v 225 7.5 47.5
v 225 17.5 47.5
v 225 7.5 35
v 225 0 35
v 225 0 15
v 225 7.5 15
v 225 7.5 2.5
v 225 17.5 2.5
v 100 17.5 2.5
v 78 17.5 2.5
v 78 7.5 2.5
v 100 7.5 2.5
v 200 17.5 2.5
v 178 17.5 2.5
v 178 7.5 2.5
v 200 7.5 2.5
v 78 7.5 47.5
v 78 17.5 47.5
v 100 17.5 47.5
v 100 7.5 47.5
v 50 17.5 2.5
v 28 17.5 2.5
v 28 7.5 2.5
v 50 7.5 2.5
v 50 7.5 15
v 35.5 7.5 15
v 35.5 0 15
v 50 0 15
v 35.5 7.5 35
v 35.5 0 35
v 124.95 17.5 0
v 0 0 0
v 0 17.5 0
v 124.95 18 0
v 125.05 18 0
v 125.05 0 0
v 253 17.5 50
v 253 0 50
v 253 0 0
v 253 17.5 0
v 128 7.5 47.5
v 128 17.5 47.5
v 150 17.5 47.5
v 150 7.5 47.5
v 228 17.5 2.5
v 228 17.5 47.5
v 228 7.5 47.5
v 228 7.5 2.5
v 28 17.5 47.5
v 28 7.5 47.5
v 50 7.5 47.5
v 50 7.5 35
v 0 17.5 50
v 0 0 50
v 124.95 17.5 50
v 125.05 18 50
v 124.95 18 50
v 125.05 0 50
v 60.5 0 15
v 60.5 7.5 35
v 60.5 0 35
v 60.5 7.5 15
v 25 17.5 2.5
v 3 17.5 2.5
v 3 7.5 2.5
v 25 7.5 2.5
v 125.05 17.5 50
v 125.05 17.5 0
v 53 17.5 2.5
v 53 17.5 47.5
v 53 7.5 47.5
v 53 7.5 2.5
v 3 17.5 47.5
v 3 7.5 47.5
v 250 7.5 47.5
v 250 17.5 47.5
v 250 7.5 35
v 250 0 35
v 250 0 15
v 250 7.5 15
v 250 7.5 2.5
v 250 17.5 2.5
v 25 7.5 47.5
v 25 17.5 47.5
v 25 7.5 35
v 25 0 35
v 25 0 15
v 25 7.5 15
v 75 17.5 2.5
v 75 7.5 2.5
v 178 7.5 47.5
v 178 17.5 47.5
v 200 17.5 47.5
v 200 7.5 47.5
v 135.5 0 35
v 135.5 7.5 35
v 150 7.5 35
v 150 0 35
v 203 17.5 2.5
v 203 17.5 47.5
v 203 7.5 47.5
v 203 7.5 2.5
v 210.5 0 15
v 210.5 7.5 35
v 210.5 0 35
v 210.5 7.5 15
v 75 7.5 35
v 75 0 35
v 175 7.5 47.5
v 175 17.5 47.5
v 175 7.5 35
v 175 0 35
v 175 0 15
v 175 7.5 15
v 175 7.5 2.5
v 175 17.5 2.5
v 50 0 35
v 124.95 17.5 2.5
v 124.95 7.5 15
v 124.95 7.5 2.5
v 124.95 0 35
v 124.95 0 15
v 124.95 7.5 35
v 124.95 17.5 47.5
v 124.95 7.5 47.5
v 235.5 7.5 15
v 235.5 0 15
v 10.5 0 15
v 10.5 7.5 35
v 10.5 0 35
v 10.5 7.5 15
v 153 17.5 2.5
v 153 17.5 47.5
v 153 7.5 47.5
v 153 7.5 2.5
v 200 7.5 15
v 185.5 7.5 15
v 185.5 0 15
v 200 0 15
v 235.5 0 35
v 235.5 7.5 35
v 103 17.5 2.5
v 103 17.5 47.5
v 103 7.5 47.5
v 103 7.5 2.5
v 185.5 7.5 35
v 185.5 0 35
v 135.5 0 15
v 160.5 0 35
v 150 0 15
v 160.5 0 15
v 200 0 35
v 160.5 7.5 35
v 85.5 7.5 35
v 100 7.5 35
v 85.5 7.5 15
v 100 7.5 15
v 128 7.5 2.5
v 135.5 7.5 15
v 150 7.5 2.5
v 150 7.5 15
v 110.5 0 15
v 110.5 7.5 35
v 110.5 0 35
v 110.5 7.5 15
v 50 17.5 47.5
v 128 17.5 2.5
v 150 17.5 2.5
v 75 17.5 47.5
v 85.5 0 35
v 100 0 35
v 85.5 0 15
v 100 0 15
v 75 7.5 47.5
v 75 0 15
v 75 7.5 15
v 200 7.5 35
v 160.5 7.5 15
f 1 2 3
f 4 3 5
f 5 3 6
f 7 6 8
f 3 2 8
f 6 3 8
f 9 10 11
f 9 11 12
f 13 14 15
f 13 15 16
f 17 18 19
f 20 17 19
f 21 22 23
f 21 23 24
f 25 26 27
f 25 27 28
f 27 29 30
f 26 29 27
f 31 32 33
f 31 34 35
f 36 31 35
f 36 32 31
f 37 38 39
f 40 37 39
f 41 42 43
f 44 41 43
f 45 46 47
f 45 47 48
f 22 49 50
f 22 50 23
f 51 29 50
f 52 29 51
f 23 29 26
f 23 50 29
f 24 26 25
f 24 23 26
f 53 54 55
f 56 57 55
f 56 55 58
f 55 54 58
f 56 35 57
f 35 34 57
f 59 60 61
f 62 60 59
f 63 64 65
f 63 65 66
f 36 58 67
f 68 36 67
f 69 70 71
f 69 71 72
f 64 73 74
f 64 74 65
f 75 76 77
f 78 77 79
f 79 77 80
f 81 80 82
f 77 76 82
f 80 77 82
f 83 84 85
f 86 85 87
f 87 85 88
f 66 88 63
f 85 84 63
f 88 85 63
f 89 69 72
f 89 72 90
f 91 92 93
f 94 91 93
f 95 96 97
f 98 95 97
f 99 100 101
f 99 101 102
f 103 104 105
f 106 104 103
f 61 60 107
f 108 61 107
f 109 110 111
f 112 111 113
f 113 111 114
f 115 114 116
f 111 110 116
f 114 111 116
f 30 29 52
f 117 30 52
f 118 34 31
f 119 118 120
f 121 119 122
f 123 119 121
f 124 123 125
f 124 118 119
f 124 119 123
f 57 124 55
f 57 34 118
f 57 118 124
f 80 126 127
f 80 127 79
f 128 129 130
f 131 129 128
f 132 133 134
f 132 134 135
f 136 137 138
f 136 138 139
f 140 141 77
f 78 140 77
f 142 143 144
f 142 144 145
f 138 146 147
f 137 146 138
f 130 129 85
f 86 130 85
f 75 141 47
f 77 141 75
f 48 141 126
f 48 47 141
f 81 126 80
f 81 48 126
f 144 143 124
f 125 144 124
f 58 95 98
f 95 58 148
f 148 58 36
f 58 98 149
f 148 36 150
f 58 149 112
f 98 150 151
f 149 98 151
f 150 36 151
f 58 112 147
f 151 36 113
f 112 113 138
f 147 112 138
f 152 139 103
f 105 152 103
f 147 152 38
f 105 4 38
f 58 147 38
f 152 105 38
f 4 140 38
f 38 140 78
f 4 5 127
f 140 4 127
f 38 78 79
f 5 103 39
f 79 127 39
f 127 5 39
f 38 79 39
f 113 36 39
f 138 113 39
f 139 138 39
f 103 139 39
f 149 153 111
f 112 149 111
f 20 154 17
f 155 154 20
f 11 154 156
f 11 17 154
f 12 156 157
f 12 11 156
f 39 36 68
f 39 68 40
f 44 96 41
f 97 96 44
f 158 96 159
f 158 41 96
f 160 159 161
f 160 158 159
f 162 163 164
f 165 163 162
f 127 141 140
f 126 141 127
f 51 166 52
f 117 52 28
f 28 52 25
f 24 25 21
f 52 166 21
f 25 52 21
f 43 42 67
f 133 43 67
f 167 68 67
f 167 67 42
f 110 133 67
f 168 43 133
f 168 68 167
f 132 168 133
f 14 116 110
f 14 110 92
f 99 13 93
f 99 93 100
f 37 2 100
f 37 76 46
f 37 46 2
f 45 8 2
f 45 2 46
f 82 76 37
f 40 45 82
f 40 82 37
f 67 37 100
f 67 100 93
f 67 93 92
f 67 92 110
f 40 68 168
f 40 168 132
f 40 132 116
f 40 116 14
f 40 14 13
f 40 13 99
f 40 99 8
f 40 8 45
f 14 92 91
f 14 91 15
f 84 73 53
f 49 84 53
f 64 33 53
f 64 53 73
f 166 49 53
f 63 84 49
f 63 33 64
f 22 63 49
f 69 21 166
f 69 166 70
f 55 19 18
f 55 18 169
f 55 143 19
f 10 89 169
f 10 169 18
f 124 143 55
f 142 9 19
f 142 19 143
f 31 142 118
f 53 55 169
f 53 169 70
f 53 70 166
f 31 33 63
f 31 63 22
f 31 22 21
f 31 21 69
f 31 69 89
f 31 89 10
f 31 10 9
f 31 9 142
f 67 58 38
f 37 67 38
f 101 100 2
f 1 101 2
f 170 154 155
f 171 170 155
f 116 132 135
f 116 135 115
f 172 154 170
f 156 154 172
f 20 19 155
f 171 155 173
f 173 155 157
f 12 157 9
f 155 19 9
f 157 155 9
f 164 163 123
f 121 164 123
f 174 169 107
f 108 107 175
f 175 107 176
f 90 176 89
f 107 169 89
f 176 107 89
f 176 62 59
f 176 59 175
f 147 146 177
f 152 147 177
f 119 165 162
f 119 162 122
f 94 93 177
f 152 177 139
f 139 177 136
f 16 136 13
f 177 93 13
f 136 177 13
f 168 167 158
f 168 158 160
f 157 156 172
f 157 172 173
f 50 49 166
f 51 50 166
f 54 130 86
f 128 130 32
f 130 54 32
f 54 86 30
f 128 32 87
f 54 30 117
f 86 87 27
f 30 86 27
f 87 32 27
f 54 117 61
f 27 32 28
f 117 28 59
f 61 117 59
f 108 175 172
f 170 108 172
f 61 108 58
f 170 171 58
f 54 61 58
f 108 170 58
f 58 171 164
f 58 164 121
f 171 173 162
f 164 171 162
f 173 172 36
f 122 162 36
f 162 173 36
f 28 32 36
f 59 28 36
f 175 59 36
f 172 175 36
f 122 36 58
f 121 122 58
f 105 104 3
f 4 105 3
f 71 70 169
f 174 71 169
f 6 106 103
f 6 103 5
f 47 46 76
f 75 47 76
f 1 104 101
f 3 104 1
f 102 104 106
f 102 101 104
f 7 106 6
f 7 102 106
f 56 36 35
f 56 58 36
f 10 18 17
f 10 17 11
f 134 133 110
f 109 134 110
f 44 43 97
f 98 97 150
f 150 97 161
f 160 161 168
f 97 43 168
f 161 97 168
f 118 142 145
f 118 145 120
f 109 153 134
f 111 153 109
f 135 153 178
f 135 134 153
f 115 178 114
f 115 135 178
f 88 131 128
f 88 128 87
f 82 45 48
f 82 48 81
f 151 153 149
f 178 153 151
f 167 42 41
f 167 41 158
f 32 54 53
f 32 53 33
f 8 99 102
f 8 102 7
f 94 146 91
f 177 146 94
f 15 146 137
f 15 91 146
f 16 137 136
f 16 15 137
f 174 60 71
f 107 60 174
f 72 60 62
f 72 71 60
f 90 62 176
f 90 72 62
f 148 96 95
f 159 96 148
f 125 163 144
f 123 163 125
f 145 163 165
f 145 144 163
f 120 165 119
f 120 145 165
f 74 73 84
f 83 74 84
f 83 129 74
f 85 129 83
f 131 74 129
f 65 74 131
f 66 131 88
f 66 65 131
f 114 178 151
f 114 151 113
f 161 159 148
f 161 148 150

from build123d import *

# Parameters (mm, degrees)
SKETCH1_W           = 253
SKETCH1_H           = 50
BOSS_EXTRUDE1_DEPTH = 17.5
SKETCH2_W           = 22
SKETCH2_H           = 45
CUT_EXTRUDE1_DEPTH  = 10
SKETCH3_W           = 14.5
SKETCH3_H           = 20
CUT_EXTRUDE2_DEPTH  = 17.5
LPATTERN1_COUNT     = 10
LPATTERN1_PITCH     = 25
SKETCH4_W           = 50
SKETCH4_H           = 18
BOSS_EXTRUDE2_DEPTH = 0.05


with BuildPart() as part:
    # Sketch1 → Boss-Extrude1 (new body)
    with BuildSketch(Plane(origin=(0, 0, 0), x_dir=(1, 0, 0), z_dir=(0, 1, 0))):
        with Locations((126.5, -25)):
            Rectangle(SKETCH1_W, SKETCH1_H)
    extrude(amount=BOSS_EXTRUDE1_DEPTH)

    # Sketch2 → Cut-Extrude1 (cut)
    with BuildSketch(Plane(origin=(0, 17.5, 0), x_dir=(1, 0, 0), z_dir=(0, 1, 0))):
        with Locations((14, -25)):
            Rectangle(SKETCH2_W, SKETCH2_H)
    cut_extrude1 = extrude(amount=-CUT_EXTRUDE1_DEPTH, mode=Mode.SUBTRACT)

    # Sketch3 → Cut-Extrude2 (cut)
    with BuildSketch(Plane(origin=(0, 17.5, 0), x_dir=(1, 0, 0), z_dir=(0, 1, 0))):
        with Locations((17.75, -25)):
            Rectangle(SKETCH3_W, SKETCH3_H)
    cut_extrude2 = extrude(amount=-CUT_EXTRUDE2_DEPTH, mode=Mode.SUBTRACT)

    # LPattern1: Cut-Extrude1, Cut-Extrude2 ×10
    with Locations(*[(i * LPATTERN1_PITCH, 0, 0) for i in range(1, LPATTERN1_COUNT)]):
        add(cut_extrude1, mode=Mode.SUBTRACT)
        add(cut_extrude2, mode=Mode.SUBTRACT)

    # Sketch4 → Boss-Extrude2 (add, symmetric)
    with BuildSketch(Plane.ZY.offset(-125)):
        with Locations((25, 9)):
            Rectangle(SKETCH4_W, SKETCH4_H)
    extrude(amount=BOSS_EXTRUDE2_DEPTH, both=True)


with BuildPart() as body_2:
    # Split1: the piece on the far side of the plane
    add(part.part)
    split(bisect_by=Plane(origin=(125.05, 0, 0), x_dir=(0, 0, -1), z_dir=(-1, 0, 0)), keep=Keep.BOTTOM)


with BuildPart() as part_1:
    add(part.part)

    # Split1
    split(bisect_by=Plane(origin=(125.05, 0, 0), x_dir=(0, 0, -1), z_dir=(-1, 0, 0)), keep=Keep.TOP)


solid = Compound([body_2.part, part_1.part])
